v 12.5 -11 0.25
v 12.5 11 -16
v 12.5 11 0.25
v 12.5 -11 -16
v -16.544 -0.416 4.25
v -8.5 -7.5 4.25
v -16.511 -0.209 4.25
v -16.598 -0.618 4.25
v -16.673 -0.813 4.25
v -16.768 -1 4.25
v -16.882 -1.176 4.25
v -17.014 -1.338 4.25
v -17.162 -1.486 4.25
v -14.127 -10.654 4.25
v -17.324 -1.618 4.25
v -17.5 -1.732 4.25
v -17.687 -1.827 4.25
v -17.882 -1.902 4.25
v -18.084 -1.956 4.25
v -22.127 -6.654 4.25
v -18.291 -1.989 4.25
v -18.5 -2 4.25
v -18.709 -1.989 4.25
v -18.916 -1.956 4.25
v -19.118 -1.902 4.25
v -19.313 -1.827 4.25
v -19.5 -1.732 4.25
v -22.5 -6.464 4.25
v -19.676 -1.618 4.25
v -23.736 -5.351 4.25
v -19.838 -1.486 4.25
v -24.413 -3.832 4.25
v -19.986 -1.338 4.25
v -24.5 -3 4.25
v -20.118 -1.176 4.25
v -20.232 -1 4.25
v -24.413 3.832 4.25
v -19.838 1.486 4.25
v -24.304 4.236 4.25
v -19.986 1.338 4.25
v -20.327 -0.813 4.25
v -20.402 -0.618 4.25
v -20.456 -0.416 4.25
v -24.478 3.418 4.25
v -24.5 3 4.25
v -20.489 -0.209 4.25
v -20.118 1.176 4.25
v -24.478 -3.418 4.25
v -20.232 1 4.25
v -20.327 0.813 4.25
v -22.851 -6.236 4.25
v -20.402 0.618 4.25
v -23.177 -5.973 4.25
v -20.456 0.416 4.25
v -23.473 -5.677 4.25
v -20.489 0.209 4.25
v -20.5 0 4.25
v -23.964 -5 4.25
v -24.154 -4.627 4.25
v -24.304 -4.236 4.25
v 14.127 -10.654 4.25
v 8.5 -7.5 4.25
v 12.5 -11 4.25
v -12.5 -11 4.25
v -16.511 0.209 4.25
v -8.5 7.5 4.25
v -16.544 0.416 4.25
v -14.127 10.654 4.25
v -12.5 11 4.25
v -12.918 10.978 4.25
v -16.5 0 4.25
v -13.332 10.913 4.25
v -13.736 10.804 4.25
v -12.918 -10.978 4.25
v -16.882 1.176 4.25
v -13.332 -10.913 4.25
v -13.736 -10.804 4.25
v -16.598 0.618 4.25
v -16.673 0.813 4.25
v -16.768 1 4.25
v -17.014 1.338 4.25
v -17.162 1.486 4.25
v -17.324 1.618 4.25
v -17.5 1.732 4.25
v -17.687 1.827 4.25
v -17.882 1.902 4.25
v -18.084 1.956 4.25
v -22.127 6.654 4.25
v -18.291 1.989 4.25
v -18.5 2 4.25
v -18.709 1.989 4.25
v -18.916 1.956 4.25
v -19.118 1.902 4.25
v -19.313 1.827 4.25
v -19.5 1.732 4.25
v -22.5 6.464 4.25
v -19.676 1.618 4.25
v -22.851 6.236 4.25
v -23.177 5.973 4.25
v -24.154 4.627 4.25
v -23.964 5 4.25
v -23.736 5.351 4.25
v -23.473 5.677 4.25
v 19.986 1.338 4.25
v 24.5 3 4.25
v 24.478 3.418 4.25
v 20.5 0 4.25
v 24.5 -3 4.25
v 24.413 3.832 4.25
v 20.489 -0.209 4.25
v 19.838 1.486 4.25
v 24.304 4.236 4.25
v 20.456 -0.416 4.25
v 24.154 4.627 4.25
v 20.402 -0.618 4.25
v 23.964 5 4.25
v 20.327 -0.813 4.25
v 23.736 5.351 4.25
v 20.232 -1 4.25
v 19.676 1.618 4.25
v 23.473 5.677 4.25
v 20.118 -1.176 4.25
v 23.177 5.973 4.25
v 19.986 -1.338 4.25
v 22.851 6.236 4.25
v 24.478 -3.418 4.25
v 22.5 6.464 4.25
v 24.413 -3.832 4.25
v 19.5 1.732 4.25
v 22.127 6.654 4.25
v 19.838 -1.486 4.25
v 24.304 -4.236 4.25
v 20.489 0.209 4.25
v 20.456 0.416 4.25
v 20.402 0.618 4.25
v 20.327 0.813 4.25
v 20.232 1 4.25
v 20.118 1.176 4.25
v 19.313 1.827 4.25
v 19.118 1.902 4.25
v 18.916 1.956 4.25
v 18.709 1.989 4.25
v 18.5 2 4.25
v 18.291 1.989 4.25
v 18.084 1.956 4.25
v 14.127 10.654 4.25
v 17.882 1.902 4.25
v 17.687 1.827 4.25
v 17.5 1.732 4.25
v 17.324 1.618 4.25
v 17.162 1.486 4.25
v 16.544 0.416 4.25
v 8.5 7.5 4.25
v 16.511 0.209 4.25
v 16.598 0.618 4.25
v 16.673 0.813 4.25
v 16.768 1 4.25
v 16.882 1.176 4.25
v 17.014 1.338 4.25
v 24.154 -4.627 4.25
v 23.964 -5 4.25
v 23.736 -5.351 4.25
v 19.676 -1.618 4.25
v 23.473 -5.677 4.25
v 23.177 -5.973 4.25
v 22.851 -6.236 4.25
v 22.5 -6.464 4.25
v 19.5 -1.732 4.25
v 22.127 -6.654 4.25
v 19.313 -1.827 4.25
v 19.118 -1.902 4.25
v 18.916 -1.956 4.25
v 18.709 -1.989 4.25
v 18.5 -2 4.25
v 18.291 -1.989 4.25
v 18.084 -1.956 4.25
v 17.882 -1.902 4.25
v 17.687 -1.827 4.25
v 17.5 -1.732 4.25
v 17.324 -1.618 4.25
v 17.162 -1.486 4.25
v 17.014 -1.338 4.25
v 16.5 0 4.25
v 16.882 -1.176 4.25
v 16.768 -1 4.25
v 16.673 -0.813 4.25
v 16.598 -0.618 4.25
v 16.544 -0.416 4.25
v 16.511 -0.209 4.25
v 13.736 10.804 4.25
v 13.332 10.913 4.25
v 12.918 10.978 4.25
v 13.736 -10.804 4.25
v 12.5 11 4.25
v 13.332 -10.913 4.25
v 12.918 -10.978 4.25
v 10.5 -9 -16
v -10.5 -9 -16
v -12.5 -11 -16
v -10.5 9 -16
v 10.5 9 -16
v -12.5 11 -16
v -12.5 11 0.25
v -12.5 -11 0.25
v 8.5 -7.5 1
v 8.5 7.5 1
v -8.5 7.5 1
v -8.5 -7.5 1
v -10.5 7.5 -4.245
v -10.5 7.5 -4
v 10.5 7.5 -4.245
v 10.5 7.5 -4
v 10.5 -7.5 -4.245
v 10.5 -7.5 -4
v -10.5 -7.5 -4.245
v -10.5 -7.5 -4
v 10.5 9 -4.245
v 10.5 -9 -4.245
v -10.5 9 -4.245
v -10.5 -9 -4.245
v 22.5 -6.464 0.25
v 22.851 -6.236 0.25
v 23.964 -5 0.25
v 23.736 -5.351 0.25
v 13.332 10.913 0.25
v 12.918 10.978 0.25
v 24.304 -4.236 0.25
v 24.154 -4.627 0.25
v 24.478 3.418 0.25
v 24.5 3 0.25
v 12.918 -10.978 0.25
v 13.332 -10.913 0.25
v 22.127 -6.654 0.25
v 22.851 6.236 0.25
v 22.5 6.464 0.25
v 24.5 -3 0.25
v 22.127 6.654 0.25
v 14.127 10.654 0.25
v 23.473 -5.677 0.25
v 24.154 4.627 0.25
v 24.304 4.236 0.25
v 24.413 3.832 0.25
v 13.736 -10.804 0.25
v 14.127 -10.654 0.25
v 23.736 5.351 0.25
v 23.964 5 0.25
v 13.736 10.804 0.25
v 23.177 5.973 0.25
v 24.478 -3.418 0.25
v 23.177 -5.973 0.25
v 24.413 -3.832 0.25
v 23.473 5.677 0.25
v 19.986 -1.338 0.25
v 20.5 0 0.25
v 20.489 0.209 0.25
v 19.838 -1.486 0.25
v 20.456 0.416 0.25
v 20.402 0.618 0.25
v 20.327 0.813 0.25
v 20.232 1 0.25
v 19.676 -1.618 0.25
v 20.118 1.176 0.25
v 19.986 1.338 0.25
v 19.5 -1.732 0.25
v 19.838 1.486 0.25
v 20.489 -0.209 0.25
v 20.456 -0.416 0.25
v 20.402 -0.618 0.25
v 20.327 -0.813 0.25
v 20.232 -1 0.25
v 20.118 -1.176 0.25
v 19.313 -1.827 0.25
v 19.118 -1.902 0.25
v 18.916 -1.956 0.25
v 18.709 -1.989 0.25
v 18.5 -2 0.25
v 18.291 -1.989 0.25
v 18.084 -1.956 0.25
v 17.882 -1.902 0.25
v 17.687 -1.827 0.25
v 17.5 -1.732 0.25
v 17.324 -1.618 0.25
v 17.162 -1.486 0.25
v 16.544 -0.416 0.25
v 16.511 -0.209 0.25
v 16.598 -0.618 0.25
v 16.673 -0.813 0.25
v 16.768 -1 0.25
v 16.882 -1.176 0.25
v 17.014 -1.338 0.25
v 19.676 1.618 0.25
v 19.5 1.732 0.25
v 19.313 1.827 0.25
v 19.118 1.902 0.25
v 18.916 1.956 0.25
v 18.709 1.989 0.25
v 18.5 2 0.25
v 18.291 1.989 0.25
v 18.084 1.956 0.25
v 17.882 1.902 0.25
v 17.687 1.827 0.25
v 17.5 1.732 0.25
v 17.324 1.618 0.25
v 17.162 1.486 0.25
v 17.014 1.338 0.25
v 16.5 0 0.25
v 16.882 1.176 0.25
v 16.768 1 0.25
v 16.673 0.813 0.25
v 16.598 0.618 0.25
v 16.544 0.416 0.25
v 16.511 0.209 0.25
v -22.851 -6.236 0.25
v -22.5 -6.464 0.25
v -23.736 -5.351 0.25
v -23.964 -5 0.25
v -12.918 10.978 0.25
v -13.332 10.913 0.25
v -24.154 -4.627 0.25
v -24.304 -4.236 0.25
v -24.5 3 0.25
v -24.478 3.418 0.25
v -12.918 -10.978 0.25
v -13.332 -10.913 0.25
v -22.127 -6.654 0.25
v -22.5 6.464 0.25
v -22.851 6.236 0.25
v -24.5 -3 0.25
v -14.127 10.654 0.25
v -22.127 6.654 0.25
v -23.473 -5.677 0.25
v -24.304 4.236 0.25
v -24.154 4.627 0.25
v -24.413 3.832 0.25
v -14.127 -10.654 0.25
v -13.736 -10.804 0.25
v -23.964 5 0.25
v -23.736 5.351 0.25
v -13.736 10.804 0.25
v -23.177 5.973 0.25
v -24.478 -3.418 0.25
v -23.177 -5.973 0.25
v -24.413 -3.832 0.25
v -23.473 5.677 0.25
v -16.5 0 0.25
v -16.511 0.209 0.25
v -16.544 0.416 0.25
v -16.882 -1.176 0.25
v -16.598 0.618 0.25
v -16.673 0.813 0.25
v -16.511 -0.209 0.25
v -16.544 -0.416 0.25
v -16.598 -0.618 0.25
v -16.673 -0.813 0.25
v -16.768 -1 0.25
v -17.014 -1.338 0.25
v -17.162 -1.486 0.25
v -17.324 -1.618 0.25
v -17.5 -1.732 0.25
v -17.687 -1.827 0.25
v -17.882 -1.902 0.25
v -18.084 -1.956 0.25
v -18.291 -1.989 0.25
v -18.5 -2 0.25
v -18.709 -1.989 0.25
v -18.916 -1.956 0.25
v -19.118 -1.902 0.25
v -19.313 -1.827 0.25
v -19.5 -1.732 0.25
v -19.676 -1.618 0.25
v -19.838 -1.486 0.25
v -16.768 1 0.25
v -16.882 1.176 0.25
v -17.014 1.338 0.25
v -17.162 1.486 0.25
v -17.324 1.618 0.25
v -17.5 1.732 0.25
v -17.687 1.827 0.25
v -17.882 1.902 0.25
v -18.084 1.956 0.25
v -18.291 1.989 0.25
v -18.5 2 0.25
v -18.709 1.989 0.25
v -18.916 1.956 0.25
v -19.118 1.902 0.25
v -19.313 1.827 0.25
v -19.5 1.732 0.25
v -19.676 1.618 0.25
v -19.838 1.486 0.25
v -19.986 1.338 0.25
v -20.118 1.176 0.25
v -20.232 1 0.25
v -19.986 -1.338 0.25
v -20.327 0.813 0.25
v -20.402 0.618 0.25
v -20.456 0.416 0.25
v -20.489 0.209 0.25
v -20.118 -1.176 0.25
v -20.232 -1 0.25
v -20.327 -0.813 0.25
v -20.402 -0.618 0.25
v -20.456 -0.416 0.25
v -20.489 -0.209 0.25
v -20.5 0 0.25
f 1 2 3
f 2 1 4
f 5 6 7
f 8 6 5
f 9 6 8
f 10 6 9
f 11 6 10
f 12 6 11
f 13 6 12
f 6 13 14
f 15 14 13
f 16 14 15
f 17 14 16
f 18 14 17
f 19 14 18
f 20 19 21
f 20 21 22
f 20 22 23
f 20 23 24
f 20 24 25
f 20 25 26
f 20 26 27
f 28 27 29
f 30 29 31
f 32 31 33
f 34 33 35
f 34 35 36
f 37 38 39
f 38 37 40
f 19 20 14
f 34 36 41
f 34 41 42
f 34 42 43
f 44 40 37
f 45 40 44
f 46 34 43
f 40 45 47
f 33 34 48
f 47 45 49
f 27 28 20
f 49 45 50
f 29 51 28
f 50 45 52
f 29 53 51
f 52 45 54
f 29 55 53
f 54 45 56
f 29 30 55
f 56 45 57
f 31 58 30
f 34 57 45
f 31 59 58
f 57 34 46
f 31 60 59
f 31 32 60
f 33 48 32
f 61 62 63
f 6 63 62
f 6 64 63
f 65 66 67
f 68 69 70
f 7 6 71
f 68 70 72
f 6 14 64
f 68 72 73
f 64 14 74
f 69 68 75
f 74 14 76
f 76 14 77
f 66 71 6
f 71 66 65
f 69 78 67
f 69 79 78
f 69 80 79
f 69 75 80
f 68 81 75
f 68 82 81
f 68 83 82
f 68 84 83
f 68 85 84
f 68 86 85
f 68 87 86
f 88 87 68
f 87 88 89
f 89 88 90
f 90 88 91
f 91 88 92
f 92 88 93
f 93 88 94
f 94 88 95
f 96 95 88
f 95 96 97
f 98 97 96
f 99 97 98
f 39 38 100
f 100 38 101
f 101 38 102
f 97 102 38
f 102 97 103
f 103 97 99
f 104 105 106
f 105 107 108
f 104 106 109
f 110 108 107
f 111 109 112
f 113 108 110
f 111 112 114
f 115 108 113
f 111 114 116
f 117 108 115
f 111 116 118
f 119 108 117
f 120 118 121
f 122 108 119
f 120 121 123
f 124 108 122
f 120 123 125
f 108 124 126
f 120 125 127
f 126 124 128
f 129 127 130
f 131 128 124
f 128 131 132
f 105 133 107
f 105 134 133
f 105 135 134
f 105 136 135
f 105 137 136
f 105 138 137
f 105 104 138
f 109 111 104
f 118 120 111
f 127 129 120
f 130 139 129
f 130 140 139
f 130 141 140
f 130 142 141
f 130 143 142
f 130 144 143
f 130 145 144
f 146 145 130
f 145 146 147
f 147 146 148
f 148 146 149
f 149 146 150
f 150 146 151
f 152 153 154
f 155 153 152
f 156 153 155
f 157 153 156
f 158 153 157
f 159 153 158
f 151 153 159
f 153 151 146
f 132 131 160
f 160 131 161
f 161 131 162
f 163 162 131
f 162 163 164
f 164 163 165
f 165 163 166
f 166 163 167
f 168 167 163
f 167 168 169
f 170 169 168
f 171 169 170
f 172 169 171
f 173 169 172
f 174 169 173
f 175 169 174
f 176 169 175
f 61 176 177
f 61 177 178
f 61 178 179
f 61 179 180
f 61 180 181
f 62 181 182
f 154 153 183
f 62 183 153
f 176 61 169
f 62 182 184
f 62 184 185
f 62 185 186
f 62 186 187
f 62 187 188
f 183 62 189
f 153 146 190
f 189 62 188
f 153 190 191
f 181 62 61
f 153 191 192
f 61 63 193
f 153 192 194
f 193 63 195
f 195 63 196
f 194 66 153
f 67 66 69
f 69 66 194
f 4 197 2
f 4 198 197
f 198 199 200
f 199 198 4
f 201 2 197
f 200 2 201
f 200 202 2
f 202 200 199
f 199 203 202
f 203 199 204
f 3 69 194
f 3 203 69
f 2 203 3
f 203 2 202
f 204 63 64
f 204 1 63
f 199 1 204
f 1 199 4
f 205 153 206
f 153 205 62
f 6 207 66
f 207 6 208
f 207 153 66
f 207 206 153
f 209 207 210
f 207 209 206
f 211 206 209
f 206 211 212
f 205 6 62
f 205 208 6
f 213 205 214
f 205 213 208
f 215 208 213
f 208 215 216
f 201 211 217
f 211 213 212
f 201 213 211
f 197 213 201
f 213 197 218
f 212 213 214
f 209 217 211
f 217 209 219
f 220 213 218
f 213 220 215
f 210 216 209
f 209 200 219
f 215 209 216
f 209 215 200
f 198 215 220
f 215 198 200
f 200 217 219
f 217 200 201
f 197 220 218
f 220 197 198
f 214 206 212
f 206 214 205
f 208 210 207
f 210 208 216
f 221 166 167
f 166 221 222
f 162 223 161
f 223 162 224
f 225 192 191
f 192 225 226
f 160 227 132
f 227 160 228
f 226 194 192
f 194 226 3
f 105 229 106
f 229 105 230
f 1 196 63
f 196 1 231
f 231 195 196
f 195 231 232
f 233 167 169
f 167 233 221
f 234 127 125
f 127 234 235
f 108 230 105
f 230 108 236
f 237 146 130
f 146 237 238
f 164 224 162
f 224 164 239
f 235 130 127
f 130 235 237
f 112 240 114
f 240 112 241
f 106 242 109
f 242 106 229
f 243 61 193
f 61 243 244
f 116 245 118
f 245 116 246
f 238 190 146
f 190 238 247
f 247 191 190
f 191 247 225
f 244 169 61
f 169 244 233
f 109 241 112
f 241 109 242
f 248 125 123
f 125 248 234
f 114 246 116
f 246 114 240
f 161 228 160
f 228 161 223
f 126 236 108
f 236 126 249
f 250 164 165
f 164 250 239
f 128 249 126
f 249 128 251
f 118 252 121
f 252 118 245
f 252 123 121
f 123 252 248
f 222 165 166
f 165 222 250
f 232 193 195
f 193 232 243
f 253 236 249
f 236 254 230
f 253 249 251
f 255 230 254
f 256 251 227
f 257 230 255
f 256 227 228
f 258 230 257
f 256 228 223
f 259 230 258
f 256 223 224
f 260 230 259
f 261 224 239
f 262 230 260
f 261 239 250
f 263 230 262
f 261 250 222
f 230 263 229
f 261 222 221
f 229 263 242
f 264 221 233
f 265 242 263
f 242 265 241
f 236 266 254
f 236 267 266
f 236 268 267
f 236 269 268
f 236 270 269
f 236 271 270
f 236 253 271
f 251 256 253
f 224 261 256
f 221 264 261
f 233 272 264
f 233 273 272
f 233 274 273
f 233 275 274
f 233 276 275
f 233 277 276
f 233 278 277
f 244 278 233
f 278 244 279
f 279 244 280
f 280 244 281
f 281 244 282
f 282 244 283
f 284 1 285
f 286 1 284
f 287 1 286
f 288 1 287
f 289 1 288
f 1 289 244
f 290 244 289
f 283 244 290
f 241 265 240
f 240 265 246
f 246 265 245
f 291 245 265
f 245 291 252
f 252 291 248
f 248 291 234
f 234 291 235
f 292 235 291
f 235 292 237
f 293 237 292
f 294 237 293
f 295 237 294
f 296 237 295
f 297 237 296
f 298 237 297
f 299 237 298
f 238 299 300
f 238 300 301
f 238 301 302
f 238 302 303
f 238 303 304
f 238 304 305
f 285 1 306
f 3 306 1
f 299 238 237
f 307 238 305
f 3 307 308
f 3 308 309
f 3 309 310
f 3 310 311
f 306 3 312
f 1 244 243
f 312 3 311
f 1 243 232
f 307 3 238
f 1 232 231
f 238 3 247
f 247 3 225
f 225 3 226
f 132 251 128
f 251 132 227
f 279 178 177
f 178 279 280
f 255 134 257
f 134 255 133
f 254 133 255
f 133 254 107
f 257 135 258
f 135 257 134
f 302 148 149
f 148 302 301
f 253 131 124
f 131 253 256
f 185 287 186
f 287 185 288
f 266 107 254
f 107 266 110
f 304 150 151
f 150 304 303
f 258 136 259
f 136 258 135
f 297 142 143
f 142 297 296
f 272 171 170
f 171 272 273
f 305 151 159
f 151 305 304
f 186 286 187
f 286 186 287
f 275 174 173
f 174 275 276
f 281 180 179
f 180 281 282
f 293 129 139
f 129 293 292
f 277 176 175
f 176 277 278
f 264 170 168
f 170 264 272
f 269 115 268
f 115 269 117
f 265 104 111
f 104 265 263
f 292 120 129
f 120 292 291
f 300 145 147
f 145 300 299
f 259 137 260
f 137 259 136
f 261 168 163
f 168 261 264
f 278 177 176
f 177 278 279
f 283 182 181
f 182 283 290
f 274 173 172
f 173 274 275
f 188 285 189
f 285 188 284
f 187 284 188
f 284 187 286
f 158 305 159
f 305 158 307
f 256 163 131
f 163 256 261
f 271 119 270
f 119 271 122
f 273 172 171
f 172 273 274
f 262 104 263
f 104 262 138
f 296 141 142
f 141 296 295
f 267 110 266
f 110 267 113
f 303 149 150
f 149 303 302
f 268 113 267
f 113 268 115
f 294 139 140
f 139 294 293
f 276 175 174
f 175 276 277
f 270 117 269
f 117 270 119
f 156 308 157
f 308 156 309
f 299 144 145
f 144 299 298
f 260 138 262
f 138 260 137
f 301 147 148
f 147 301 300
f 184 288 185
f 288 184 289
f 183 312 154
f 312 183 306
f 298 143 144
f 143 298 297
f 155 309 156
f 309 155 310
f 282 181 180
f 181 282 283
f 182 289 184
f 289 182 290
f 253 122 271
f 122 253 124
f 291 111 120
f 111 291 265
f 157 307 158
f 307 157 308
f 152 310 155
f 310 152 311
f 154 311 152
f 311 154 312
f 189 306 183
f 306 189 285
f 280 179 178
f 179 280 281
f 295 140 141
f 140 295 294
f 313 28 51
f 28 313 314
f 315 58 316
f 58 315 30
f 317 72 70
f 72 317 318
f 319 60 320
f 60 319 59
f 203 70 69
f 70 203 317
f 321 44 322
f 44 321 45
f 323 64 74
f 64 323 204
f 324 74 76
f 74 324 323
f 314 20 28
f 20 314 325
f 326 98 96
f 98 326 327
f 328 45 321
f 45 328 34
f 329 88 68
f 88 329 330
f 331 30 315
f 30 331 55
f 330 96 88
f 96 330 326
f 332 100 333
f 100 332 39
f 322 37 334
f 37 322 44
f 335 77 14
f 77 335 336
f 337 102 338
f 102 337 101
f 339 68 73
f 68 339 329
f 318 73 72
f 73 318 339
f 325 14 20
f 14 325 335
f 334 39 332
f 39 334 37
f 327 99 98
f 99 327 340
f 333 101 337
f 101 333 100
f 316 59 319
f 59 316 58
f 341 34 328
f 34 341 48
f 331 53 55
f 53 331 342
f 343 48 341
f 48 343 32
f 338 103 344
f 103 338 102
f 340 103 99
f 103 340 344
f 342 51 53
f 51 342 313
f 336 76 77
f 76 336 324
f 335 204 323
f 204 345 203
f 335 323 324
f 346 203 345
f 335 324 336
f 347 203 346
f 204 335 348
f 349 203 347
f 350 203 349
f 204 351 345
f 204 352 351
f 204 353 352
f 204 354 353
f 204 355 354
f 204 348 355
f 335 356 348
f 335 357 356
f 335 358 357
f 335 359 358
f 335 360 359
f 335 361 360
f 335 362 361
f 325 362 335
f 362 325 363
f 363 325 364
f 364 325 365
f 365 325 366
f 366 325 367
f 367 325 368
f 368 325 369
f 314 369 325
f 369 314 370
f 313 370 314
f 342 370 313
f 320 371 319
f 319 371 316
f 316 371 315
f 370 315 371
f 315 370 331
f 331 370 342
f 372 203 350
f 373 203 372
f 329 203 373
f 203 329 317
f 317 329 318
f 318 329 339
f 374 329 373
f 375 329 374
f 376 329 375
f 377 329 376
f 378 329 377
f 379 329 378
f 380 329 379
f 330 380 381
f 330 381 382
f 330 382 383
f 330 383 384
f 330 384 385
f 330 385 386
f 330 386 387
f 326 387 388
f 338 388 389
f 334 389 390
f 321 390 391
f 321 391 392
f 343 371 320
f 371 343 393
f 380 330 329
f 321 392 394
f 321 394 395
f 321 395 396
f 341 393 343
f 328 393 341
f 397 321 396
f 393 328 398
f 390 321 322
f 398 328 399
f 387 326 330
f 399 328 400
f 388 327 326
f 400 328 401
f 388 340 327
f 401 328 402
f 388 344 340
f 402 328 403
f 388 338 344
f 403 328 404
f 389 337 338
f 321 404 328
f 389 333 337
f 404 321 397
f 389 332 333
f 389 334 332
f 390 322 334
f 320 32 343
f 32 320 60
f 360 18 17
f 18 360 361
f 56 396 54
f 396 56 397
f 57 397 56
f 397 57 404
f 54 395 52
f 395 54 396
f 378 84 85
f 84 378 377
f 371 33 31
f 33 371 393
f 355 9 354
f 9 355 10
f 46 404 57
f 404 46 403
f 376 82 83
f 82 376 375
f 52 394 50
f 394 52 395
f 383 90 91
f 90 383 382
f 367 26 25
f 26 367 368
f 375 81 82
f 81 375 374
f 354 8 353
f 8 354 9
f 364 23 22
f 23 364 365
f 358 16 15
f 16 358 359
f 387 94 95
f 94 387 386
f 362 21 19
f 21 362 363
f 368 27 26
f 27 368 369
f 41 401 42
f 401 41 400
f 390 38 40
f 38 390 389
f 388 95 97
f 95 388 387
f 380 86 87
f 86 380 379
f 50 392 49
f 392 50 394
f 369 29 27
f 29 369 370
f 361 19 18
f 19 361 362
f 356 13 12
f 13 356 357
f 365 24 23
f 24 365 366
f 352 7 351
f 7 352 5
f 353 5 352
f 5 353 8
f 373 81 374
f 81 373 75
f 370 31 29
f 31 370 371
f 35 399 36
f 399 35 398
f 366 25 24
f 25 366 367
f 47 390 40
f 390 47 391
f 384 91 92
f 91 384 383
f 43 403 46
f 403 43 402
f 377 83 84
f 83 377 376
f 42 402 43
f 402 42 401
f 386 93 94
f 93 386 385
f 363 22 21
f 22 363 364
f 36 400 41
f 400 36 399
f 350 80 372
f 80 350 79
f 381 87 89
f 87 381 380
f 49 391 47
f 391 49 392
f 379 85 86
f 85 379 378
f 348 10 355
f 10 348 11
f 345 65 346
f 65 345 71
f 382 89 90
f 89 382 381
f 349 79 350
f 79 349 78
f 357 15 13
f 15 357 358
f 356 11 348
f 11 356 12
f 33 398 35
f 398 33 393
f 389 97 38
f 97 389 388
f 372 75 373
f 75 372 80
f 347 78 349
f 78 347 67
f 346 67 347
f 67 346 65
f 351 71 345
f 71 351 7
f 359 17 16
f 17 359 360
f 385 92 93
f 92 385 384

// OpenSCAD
SLOP = 0.01;
$fn = 60;
KEYSTONE_FACE_WIDTH = 17;
KEYSTONE_FACE_HEIGHT = 15;
KEYSTONE_FACE_DEPTH = 8.5;
KEYSTONE_CLIP_WIDTH = 21;
KEYSTONE_CLIP_HEIGHT = 18;
KEYSTONE_CLIP_DEPTH = 11.75;
KEYSTONE_JACKET_WIDTH = KEYSTONE_CLIP_WIDTH + 4;
KEYSTONE_JACKET_HEIGHT = KEYSTONE_CLIP_HEIGHT + 4;
KEYSTONE_JACKET_DEPTH = KEYSTONE_FACE_DEPTH + KEYSTONE_CLIP_DEPTH;

MOUNT_DEPTH = 4;
MOUNT_BOLT_DIAMETER = 4;

difference() {
    translate([0, 0, KEYSTONE_FACE_DEPTH/2 -KEYSTONE_JACKET_DEPTH/2])
    cube([
        KEYSTONE_JACKET_WIDTH,
        KEYSTONE_JACKET_HEIGHT,
        KEYSTONE_JACKET_DEPTH
    ], center=true);

    cube([
        KEYSTONE_FACE_WIDTH,
        KEYSTONE_FACE_HEIGHT,
        KEYSTONE_FACE_DEPTH + SLOP
        ],
        center=true
    );

    translate([0, 0, -KEYSTONE_FACE_DEPTH/2 - KEYSTONE_CLIP_DEPTH/2])
    cube([
        KEYSTONE_CLIP_WIDTH,
        KEYSTONE_CLIP_HEIGHT,
        KEYSTONE_CLIP_DEPTH + SLOP
        ],
        center=true
    );

    hull() {
        translate([0, 0, 0])
        cube([
            KEYSTONE_FACE_WIDTH,
            KEYSTONE_FACE_HEIGHT,
            2
        ], center=true);

        translate([0, 0, -5])
        cube([
            KEYSTONE_CLIP_WIDTH,
            KEYSTONE_FACE_HEIGHT,
            2
        ], center=true);
    }
}




module mount() {
    translate([0, 0, KEYSTONE_FACE_DEPTH/2 - MOUNT_DEPTH/2])
    difference() {
        intersection() {
            translate([KEYSTONE_JACKET_WIDTH/2, -50, -50])
            cube([
                100,
                100,
                100
                ]
            );
            hull() {
                translate([KEYSTONE_JACKET_WIDTH/2, KEYSTONE_JACKET_HEIGHT/2 - 4, 0])
                cylinder(h=MOUNT_DEPTH, r=4, center=true);

                translate([KEYSTONE_JACKET_WIDTH/2, -KEYSTONE_JACKET_HEIGHT/2 + 4, 0])
                cylinder(h=MOUNT_DEPTH, r=4, center=true);

                translate([KEYSTONE_JACKET_WIDTH/2 + 8, KEYSTONE_JACKET_HEIGHT/2 - 8, 0])
                cylinder(h=MOUNT_DEPTH, r=4, center=true);

                translate([KEYSTONE_JACKET_WIDTH/2 + 8, -KEYSTONE_JACKET_HEIGHT/2 + 8, 0])
                cylinder(h=MOUNT_DEPTH, r=4, center=true);
            }
        }

        translate([KEYSTONE_JACKET_WIDTH/2  + 6, 0, 0])
        cylinder(h=MOUNT_DEPTH + 8, d=MOUNT_BOLT_DIAMETER, center=true);
    }
}

mount();
mirror([1, 0, 0])
mount();
